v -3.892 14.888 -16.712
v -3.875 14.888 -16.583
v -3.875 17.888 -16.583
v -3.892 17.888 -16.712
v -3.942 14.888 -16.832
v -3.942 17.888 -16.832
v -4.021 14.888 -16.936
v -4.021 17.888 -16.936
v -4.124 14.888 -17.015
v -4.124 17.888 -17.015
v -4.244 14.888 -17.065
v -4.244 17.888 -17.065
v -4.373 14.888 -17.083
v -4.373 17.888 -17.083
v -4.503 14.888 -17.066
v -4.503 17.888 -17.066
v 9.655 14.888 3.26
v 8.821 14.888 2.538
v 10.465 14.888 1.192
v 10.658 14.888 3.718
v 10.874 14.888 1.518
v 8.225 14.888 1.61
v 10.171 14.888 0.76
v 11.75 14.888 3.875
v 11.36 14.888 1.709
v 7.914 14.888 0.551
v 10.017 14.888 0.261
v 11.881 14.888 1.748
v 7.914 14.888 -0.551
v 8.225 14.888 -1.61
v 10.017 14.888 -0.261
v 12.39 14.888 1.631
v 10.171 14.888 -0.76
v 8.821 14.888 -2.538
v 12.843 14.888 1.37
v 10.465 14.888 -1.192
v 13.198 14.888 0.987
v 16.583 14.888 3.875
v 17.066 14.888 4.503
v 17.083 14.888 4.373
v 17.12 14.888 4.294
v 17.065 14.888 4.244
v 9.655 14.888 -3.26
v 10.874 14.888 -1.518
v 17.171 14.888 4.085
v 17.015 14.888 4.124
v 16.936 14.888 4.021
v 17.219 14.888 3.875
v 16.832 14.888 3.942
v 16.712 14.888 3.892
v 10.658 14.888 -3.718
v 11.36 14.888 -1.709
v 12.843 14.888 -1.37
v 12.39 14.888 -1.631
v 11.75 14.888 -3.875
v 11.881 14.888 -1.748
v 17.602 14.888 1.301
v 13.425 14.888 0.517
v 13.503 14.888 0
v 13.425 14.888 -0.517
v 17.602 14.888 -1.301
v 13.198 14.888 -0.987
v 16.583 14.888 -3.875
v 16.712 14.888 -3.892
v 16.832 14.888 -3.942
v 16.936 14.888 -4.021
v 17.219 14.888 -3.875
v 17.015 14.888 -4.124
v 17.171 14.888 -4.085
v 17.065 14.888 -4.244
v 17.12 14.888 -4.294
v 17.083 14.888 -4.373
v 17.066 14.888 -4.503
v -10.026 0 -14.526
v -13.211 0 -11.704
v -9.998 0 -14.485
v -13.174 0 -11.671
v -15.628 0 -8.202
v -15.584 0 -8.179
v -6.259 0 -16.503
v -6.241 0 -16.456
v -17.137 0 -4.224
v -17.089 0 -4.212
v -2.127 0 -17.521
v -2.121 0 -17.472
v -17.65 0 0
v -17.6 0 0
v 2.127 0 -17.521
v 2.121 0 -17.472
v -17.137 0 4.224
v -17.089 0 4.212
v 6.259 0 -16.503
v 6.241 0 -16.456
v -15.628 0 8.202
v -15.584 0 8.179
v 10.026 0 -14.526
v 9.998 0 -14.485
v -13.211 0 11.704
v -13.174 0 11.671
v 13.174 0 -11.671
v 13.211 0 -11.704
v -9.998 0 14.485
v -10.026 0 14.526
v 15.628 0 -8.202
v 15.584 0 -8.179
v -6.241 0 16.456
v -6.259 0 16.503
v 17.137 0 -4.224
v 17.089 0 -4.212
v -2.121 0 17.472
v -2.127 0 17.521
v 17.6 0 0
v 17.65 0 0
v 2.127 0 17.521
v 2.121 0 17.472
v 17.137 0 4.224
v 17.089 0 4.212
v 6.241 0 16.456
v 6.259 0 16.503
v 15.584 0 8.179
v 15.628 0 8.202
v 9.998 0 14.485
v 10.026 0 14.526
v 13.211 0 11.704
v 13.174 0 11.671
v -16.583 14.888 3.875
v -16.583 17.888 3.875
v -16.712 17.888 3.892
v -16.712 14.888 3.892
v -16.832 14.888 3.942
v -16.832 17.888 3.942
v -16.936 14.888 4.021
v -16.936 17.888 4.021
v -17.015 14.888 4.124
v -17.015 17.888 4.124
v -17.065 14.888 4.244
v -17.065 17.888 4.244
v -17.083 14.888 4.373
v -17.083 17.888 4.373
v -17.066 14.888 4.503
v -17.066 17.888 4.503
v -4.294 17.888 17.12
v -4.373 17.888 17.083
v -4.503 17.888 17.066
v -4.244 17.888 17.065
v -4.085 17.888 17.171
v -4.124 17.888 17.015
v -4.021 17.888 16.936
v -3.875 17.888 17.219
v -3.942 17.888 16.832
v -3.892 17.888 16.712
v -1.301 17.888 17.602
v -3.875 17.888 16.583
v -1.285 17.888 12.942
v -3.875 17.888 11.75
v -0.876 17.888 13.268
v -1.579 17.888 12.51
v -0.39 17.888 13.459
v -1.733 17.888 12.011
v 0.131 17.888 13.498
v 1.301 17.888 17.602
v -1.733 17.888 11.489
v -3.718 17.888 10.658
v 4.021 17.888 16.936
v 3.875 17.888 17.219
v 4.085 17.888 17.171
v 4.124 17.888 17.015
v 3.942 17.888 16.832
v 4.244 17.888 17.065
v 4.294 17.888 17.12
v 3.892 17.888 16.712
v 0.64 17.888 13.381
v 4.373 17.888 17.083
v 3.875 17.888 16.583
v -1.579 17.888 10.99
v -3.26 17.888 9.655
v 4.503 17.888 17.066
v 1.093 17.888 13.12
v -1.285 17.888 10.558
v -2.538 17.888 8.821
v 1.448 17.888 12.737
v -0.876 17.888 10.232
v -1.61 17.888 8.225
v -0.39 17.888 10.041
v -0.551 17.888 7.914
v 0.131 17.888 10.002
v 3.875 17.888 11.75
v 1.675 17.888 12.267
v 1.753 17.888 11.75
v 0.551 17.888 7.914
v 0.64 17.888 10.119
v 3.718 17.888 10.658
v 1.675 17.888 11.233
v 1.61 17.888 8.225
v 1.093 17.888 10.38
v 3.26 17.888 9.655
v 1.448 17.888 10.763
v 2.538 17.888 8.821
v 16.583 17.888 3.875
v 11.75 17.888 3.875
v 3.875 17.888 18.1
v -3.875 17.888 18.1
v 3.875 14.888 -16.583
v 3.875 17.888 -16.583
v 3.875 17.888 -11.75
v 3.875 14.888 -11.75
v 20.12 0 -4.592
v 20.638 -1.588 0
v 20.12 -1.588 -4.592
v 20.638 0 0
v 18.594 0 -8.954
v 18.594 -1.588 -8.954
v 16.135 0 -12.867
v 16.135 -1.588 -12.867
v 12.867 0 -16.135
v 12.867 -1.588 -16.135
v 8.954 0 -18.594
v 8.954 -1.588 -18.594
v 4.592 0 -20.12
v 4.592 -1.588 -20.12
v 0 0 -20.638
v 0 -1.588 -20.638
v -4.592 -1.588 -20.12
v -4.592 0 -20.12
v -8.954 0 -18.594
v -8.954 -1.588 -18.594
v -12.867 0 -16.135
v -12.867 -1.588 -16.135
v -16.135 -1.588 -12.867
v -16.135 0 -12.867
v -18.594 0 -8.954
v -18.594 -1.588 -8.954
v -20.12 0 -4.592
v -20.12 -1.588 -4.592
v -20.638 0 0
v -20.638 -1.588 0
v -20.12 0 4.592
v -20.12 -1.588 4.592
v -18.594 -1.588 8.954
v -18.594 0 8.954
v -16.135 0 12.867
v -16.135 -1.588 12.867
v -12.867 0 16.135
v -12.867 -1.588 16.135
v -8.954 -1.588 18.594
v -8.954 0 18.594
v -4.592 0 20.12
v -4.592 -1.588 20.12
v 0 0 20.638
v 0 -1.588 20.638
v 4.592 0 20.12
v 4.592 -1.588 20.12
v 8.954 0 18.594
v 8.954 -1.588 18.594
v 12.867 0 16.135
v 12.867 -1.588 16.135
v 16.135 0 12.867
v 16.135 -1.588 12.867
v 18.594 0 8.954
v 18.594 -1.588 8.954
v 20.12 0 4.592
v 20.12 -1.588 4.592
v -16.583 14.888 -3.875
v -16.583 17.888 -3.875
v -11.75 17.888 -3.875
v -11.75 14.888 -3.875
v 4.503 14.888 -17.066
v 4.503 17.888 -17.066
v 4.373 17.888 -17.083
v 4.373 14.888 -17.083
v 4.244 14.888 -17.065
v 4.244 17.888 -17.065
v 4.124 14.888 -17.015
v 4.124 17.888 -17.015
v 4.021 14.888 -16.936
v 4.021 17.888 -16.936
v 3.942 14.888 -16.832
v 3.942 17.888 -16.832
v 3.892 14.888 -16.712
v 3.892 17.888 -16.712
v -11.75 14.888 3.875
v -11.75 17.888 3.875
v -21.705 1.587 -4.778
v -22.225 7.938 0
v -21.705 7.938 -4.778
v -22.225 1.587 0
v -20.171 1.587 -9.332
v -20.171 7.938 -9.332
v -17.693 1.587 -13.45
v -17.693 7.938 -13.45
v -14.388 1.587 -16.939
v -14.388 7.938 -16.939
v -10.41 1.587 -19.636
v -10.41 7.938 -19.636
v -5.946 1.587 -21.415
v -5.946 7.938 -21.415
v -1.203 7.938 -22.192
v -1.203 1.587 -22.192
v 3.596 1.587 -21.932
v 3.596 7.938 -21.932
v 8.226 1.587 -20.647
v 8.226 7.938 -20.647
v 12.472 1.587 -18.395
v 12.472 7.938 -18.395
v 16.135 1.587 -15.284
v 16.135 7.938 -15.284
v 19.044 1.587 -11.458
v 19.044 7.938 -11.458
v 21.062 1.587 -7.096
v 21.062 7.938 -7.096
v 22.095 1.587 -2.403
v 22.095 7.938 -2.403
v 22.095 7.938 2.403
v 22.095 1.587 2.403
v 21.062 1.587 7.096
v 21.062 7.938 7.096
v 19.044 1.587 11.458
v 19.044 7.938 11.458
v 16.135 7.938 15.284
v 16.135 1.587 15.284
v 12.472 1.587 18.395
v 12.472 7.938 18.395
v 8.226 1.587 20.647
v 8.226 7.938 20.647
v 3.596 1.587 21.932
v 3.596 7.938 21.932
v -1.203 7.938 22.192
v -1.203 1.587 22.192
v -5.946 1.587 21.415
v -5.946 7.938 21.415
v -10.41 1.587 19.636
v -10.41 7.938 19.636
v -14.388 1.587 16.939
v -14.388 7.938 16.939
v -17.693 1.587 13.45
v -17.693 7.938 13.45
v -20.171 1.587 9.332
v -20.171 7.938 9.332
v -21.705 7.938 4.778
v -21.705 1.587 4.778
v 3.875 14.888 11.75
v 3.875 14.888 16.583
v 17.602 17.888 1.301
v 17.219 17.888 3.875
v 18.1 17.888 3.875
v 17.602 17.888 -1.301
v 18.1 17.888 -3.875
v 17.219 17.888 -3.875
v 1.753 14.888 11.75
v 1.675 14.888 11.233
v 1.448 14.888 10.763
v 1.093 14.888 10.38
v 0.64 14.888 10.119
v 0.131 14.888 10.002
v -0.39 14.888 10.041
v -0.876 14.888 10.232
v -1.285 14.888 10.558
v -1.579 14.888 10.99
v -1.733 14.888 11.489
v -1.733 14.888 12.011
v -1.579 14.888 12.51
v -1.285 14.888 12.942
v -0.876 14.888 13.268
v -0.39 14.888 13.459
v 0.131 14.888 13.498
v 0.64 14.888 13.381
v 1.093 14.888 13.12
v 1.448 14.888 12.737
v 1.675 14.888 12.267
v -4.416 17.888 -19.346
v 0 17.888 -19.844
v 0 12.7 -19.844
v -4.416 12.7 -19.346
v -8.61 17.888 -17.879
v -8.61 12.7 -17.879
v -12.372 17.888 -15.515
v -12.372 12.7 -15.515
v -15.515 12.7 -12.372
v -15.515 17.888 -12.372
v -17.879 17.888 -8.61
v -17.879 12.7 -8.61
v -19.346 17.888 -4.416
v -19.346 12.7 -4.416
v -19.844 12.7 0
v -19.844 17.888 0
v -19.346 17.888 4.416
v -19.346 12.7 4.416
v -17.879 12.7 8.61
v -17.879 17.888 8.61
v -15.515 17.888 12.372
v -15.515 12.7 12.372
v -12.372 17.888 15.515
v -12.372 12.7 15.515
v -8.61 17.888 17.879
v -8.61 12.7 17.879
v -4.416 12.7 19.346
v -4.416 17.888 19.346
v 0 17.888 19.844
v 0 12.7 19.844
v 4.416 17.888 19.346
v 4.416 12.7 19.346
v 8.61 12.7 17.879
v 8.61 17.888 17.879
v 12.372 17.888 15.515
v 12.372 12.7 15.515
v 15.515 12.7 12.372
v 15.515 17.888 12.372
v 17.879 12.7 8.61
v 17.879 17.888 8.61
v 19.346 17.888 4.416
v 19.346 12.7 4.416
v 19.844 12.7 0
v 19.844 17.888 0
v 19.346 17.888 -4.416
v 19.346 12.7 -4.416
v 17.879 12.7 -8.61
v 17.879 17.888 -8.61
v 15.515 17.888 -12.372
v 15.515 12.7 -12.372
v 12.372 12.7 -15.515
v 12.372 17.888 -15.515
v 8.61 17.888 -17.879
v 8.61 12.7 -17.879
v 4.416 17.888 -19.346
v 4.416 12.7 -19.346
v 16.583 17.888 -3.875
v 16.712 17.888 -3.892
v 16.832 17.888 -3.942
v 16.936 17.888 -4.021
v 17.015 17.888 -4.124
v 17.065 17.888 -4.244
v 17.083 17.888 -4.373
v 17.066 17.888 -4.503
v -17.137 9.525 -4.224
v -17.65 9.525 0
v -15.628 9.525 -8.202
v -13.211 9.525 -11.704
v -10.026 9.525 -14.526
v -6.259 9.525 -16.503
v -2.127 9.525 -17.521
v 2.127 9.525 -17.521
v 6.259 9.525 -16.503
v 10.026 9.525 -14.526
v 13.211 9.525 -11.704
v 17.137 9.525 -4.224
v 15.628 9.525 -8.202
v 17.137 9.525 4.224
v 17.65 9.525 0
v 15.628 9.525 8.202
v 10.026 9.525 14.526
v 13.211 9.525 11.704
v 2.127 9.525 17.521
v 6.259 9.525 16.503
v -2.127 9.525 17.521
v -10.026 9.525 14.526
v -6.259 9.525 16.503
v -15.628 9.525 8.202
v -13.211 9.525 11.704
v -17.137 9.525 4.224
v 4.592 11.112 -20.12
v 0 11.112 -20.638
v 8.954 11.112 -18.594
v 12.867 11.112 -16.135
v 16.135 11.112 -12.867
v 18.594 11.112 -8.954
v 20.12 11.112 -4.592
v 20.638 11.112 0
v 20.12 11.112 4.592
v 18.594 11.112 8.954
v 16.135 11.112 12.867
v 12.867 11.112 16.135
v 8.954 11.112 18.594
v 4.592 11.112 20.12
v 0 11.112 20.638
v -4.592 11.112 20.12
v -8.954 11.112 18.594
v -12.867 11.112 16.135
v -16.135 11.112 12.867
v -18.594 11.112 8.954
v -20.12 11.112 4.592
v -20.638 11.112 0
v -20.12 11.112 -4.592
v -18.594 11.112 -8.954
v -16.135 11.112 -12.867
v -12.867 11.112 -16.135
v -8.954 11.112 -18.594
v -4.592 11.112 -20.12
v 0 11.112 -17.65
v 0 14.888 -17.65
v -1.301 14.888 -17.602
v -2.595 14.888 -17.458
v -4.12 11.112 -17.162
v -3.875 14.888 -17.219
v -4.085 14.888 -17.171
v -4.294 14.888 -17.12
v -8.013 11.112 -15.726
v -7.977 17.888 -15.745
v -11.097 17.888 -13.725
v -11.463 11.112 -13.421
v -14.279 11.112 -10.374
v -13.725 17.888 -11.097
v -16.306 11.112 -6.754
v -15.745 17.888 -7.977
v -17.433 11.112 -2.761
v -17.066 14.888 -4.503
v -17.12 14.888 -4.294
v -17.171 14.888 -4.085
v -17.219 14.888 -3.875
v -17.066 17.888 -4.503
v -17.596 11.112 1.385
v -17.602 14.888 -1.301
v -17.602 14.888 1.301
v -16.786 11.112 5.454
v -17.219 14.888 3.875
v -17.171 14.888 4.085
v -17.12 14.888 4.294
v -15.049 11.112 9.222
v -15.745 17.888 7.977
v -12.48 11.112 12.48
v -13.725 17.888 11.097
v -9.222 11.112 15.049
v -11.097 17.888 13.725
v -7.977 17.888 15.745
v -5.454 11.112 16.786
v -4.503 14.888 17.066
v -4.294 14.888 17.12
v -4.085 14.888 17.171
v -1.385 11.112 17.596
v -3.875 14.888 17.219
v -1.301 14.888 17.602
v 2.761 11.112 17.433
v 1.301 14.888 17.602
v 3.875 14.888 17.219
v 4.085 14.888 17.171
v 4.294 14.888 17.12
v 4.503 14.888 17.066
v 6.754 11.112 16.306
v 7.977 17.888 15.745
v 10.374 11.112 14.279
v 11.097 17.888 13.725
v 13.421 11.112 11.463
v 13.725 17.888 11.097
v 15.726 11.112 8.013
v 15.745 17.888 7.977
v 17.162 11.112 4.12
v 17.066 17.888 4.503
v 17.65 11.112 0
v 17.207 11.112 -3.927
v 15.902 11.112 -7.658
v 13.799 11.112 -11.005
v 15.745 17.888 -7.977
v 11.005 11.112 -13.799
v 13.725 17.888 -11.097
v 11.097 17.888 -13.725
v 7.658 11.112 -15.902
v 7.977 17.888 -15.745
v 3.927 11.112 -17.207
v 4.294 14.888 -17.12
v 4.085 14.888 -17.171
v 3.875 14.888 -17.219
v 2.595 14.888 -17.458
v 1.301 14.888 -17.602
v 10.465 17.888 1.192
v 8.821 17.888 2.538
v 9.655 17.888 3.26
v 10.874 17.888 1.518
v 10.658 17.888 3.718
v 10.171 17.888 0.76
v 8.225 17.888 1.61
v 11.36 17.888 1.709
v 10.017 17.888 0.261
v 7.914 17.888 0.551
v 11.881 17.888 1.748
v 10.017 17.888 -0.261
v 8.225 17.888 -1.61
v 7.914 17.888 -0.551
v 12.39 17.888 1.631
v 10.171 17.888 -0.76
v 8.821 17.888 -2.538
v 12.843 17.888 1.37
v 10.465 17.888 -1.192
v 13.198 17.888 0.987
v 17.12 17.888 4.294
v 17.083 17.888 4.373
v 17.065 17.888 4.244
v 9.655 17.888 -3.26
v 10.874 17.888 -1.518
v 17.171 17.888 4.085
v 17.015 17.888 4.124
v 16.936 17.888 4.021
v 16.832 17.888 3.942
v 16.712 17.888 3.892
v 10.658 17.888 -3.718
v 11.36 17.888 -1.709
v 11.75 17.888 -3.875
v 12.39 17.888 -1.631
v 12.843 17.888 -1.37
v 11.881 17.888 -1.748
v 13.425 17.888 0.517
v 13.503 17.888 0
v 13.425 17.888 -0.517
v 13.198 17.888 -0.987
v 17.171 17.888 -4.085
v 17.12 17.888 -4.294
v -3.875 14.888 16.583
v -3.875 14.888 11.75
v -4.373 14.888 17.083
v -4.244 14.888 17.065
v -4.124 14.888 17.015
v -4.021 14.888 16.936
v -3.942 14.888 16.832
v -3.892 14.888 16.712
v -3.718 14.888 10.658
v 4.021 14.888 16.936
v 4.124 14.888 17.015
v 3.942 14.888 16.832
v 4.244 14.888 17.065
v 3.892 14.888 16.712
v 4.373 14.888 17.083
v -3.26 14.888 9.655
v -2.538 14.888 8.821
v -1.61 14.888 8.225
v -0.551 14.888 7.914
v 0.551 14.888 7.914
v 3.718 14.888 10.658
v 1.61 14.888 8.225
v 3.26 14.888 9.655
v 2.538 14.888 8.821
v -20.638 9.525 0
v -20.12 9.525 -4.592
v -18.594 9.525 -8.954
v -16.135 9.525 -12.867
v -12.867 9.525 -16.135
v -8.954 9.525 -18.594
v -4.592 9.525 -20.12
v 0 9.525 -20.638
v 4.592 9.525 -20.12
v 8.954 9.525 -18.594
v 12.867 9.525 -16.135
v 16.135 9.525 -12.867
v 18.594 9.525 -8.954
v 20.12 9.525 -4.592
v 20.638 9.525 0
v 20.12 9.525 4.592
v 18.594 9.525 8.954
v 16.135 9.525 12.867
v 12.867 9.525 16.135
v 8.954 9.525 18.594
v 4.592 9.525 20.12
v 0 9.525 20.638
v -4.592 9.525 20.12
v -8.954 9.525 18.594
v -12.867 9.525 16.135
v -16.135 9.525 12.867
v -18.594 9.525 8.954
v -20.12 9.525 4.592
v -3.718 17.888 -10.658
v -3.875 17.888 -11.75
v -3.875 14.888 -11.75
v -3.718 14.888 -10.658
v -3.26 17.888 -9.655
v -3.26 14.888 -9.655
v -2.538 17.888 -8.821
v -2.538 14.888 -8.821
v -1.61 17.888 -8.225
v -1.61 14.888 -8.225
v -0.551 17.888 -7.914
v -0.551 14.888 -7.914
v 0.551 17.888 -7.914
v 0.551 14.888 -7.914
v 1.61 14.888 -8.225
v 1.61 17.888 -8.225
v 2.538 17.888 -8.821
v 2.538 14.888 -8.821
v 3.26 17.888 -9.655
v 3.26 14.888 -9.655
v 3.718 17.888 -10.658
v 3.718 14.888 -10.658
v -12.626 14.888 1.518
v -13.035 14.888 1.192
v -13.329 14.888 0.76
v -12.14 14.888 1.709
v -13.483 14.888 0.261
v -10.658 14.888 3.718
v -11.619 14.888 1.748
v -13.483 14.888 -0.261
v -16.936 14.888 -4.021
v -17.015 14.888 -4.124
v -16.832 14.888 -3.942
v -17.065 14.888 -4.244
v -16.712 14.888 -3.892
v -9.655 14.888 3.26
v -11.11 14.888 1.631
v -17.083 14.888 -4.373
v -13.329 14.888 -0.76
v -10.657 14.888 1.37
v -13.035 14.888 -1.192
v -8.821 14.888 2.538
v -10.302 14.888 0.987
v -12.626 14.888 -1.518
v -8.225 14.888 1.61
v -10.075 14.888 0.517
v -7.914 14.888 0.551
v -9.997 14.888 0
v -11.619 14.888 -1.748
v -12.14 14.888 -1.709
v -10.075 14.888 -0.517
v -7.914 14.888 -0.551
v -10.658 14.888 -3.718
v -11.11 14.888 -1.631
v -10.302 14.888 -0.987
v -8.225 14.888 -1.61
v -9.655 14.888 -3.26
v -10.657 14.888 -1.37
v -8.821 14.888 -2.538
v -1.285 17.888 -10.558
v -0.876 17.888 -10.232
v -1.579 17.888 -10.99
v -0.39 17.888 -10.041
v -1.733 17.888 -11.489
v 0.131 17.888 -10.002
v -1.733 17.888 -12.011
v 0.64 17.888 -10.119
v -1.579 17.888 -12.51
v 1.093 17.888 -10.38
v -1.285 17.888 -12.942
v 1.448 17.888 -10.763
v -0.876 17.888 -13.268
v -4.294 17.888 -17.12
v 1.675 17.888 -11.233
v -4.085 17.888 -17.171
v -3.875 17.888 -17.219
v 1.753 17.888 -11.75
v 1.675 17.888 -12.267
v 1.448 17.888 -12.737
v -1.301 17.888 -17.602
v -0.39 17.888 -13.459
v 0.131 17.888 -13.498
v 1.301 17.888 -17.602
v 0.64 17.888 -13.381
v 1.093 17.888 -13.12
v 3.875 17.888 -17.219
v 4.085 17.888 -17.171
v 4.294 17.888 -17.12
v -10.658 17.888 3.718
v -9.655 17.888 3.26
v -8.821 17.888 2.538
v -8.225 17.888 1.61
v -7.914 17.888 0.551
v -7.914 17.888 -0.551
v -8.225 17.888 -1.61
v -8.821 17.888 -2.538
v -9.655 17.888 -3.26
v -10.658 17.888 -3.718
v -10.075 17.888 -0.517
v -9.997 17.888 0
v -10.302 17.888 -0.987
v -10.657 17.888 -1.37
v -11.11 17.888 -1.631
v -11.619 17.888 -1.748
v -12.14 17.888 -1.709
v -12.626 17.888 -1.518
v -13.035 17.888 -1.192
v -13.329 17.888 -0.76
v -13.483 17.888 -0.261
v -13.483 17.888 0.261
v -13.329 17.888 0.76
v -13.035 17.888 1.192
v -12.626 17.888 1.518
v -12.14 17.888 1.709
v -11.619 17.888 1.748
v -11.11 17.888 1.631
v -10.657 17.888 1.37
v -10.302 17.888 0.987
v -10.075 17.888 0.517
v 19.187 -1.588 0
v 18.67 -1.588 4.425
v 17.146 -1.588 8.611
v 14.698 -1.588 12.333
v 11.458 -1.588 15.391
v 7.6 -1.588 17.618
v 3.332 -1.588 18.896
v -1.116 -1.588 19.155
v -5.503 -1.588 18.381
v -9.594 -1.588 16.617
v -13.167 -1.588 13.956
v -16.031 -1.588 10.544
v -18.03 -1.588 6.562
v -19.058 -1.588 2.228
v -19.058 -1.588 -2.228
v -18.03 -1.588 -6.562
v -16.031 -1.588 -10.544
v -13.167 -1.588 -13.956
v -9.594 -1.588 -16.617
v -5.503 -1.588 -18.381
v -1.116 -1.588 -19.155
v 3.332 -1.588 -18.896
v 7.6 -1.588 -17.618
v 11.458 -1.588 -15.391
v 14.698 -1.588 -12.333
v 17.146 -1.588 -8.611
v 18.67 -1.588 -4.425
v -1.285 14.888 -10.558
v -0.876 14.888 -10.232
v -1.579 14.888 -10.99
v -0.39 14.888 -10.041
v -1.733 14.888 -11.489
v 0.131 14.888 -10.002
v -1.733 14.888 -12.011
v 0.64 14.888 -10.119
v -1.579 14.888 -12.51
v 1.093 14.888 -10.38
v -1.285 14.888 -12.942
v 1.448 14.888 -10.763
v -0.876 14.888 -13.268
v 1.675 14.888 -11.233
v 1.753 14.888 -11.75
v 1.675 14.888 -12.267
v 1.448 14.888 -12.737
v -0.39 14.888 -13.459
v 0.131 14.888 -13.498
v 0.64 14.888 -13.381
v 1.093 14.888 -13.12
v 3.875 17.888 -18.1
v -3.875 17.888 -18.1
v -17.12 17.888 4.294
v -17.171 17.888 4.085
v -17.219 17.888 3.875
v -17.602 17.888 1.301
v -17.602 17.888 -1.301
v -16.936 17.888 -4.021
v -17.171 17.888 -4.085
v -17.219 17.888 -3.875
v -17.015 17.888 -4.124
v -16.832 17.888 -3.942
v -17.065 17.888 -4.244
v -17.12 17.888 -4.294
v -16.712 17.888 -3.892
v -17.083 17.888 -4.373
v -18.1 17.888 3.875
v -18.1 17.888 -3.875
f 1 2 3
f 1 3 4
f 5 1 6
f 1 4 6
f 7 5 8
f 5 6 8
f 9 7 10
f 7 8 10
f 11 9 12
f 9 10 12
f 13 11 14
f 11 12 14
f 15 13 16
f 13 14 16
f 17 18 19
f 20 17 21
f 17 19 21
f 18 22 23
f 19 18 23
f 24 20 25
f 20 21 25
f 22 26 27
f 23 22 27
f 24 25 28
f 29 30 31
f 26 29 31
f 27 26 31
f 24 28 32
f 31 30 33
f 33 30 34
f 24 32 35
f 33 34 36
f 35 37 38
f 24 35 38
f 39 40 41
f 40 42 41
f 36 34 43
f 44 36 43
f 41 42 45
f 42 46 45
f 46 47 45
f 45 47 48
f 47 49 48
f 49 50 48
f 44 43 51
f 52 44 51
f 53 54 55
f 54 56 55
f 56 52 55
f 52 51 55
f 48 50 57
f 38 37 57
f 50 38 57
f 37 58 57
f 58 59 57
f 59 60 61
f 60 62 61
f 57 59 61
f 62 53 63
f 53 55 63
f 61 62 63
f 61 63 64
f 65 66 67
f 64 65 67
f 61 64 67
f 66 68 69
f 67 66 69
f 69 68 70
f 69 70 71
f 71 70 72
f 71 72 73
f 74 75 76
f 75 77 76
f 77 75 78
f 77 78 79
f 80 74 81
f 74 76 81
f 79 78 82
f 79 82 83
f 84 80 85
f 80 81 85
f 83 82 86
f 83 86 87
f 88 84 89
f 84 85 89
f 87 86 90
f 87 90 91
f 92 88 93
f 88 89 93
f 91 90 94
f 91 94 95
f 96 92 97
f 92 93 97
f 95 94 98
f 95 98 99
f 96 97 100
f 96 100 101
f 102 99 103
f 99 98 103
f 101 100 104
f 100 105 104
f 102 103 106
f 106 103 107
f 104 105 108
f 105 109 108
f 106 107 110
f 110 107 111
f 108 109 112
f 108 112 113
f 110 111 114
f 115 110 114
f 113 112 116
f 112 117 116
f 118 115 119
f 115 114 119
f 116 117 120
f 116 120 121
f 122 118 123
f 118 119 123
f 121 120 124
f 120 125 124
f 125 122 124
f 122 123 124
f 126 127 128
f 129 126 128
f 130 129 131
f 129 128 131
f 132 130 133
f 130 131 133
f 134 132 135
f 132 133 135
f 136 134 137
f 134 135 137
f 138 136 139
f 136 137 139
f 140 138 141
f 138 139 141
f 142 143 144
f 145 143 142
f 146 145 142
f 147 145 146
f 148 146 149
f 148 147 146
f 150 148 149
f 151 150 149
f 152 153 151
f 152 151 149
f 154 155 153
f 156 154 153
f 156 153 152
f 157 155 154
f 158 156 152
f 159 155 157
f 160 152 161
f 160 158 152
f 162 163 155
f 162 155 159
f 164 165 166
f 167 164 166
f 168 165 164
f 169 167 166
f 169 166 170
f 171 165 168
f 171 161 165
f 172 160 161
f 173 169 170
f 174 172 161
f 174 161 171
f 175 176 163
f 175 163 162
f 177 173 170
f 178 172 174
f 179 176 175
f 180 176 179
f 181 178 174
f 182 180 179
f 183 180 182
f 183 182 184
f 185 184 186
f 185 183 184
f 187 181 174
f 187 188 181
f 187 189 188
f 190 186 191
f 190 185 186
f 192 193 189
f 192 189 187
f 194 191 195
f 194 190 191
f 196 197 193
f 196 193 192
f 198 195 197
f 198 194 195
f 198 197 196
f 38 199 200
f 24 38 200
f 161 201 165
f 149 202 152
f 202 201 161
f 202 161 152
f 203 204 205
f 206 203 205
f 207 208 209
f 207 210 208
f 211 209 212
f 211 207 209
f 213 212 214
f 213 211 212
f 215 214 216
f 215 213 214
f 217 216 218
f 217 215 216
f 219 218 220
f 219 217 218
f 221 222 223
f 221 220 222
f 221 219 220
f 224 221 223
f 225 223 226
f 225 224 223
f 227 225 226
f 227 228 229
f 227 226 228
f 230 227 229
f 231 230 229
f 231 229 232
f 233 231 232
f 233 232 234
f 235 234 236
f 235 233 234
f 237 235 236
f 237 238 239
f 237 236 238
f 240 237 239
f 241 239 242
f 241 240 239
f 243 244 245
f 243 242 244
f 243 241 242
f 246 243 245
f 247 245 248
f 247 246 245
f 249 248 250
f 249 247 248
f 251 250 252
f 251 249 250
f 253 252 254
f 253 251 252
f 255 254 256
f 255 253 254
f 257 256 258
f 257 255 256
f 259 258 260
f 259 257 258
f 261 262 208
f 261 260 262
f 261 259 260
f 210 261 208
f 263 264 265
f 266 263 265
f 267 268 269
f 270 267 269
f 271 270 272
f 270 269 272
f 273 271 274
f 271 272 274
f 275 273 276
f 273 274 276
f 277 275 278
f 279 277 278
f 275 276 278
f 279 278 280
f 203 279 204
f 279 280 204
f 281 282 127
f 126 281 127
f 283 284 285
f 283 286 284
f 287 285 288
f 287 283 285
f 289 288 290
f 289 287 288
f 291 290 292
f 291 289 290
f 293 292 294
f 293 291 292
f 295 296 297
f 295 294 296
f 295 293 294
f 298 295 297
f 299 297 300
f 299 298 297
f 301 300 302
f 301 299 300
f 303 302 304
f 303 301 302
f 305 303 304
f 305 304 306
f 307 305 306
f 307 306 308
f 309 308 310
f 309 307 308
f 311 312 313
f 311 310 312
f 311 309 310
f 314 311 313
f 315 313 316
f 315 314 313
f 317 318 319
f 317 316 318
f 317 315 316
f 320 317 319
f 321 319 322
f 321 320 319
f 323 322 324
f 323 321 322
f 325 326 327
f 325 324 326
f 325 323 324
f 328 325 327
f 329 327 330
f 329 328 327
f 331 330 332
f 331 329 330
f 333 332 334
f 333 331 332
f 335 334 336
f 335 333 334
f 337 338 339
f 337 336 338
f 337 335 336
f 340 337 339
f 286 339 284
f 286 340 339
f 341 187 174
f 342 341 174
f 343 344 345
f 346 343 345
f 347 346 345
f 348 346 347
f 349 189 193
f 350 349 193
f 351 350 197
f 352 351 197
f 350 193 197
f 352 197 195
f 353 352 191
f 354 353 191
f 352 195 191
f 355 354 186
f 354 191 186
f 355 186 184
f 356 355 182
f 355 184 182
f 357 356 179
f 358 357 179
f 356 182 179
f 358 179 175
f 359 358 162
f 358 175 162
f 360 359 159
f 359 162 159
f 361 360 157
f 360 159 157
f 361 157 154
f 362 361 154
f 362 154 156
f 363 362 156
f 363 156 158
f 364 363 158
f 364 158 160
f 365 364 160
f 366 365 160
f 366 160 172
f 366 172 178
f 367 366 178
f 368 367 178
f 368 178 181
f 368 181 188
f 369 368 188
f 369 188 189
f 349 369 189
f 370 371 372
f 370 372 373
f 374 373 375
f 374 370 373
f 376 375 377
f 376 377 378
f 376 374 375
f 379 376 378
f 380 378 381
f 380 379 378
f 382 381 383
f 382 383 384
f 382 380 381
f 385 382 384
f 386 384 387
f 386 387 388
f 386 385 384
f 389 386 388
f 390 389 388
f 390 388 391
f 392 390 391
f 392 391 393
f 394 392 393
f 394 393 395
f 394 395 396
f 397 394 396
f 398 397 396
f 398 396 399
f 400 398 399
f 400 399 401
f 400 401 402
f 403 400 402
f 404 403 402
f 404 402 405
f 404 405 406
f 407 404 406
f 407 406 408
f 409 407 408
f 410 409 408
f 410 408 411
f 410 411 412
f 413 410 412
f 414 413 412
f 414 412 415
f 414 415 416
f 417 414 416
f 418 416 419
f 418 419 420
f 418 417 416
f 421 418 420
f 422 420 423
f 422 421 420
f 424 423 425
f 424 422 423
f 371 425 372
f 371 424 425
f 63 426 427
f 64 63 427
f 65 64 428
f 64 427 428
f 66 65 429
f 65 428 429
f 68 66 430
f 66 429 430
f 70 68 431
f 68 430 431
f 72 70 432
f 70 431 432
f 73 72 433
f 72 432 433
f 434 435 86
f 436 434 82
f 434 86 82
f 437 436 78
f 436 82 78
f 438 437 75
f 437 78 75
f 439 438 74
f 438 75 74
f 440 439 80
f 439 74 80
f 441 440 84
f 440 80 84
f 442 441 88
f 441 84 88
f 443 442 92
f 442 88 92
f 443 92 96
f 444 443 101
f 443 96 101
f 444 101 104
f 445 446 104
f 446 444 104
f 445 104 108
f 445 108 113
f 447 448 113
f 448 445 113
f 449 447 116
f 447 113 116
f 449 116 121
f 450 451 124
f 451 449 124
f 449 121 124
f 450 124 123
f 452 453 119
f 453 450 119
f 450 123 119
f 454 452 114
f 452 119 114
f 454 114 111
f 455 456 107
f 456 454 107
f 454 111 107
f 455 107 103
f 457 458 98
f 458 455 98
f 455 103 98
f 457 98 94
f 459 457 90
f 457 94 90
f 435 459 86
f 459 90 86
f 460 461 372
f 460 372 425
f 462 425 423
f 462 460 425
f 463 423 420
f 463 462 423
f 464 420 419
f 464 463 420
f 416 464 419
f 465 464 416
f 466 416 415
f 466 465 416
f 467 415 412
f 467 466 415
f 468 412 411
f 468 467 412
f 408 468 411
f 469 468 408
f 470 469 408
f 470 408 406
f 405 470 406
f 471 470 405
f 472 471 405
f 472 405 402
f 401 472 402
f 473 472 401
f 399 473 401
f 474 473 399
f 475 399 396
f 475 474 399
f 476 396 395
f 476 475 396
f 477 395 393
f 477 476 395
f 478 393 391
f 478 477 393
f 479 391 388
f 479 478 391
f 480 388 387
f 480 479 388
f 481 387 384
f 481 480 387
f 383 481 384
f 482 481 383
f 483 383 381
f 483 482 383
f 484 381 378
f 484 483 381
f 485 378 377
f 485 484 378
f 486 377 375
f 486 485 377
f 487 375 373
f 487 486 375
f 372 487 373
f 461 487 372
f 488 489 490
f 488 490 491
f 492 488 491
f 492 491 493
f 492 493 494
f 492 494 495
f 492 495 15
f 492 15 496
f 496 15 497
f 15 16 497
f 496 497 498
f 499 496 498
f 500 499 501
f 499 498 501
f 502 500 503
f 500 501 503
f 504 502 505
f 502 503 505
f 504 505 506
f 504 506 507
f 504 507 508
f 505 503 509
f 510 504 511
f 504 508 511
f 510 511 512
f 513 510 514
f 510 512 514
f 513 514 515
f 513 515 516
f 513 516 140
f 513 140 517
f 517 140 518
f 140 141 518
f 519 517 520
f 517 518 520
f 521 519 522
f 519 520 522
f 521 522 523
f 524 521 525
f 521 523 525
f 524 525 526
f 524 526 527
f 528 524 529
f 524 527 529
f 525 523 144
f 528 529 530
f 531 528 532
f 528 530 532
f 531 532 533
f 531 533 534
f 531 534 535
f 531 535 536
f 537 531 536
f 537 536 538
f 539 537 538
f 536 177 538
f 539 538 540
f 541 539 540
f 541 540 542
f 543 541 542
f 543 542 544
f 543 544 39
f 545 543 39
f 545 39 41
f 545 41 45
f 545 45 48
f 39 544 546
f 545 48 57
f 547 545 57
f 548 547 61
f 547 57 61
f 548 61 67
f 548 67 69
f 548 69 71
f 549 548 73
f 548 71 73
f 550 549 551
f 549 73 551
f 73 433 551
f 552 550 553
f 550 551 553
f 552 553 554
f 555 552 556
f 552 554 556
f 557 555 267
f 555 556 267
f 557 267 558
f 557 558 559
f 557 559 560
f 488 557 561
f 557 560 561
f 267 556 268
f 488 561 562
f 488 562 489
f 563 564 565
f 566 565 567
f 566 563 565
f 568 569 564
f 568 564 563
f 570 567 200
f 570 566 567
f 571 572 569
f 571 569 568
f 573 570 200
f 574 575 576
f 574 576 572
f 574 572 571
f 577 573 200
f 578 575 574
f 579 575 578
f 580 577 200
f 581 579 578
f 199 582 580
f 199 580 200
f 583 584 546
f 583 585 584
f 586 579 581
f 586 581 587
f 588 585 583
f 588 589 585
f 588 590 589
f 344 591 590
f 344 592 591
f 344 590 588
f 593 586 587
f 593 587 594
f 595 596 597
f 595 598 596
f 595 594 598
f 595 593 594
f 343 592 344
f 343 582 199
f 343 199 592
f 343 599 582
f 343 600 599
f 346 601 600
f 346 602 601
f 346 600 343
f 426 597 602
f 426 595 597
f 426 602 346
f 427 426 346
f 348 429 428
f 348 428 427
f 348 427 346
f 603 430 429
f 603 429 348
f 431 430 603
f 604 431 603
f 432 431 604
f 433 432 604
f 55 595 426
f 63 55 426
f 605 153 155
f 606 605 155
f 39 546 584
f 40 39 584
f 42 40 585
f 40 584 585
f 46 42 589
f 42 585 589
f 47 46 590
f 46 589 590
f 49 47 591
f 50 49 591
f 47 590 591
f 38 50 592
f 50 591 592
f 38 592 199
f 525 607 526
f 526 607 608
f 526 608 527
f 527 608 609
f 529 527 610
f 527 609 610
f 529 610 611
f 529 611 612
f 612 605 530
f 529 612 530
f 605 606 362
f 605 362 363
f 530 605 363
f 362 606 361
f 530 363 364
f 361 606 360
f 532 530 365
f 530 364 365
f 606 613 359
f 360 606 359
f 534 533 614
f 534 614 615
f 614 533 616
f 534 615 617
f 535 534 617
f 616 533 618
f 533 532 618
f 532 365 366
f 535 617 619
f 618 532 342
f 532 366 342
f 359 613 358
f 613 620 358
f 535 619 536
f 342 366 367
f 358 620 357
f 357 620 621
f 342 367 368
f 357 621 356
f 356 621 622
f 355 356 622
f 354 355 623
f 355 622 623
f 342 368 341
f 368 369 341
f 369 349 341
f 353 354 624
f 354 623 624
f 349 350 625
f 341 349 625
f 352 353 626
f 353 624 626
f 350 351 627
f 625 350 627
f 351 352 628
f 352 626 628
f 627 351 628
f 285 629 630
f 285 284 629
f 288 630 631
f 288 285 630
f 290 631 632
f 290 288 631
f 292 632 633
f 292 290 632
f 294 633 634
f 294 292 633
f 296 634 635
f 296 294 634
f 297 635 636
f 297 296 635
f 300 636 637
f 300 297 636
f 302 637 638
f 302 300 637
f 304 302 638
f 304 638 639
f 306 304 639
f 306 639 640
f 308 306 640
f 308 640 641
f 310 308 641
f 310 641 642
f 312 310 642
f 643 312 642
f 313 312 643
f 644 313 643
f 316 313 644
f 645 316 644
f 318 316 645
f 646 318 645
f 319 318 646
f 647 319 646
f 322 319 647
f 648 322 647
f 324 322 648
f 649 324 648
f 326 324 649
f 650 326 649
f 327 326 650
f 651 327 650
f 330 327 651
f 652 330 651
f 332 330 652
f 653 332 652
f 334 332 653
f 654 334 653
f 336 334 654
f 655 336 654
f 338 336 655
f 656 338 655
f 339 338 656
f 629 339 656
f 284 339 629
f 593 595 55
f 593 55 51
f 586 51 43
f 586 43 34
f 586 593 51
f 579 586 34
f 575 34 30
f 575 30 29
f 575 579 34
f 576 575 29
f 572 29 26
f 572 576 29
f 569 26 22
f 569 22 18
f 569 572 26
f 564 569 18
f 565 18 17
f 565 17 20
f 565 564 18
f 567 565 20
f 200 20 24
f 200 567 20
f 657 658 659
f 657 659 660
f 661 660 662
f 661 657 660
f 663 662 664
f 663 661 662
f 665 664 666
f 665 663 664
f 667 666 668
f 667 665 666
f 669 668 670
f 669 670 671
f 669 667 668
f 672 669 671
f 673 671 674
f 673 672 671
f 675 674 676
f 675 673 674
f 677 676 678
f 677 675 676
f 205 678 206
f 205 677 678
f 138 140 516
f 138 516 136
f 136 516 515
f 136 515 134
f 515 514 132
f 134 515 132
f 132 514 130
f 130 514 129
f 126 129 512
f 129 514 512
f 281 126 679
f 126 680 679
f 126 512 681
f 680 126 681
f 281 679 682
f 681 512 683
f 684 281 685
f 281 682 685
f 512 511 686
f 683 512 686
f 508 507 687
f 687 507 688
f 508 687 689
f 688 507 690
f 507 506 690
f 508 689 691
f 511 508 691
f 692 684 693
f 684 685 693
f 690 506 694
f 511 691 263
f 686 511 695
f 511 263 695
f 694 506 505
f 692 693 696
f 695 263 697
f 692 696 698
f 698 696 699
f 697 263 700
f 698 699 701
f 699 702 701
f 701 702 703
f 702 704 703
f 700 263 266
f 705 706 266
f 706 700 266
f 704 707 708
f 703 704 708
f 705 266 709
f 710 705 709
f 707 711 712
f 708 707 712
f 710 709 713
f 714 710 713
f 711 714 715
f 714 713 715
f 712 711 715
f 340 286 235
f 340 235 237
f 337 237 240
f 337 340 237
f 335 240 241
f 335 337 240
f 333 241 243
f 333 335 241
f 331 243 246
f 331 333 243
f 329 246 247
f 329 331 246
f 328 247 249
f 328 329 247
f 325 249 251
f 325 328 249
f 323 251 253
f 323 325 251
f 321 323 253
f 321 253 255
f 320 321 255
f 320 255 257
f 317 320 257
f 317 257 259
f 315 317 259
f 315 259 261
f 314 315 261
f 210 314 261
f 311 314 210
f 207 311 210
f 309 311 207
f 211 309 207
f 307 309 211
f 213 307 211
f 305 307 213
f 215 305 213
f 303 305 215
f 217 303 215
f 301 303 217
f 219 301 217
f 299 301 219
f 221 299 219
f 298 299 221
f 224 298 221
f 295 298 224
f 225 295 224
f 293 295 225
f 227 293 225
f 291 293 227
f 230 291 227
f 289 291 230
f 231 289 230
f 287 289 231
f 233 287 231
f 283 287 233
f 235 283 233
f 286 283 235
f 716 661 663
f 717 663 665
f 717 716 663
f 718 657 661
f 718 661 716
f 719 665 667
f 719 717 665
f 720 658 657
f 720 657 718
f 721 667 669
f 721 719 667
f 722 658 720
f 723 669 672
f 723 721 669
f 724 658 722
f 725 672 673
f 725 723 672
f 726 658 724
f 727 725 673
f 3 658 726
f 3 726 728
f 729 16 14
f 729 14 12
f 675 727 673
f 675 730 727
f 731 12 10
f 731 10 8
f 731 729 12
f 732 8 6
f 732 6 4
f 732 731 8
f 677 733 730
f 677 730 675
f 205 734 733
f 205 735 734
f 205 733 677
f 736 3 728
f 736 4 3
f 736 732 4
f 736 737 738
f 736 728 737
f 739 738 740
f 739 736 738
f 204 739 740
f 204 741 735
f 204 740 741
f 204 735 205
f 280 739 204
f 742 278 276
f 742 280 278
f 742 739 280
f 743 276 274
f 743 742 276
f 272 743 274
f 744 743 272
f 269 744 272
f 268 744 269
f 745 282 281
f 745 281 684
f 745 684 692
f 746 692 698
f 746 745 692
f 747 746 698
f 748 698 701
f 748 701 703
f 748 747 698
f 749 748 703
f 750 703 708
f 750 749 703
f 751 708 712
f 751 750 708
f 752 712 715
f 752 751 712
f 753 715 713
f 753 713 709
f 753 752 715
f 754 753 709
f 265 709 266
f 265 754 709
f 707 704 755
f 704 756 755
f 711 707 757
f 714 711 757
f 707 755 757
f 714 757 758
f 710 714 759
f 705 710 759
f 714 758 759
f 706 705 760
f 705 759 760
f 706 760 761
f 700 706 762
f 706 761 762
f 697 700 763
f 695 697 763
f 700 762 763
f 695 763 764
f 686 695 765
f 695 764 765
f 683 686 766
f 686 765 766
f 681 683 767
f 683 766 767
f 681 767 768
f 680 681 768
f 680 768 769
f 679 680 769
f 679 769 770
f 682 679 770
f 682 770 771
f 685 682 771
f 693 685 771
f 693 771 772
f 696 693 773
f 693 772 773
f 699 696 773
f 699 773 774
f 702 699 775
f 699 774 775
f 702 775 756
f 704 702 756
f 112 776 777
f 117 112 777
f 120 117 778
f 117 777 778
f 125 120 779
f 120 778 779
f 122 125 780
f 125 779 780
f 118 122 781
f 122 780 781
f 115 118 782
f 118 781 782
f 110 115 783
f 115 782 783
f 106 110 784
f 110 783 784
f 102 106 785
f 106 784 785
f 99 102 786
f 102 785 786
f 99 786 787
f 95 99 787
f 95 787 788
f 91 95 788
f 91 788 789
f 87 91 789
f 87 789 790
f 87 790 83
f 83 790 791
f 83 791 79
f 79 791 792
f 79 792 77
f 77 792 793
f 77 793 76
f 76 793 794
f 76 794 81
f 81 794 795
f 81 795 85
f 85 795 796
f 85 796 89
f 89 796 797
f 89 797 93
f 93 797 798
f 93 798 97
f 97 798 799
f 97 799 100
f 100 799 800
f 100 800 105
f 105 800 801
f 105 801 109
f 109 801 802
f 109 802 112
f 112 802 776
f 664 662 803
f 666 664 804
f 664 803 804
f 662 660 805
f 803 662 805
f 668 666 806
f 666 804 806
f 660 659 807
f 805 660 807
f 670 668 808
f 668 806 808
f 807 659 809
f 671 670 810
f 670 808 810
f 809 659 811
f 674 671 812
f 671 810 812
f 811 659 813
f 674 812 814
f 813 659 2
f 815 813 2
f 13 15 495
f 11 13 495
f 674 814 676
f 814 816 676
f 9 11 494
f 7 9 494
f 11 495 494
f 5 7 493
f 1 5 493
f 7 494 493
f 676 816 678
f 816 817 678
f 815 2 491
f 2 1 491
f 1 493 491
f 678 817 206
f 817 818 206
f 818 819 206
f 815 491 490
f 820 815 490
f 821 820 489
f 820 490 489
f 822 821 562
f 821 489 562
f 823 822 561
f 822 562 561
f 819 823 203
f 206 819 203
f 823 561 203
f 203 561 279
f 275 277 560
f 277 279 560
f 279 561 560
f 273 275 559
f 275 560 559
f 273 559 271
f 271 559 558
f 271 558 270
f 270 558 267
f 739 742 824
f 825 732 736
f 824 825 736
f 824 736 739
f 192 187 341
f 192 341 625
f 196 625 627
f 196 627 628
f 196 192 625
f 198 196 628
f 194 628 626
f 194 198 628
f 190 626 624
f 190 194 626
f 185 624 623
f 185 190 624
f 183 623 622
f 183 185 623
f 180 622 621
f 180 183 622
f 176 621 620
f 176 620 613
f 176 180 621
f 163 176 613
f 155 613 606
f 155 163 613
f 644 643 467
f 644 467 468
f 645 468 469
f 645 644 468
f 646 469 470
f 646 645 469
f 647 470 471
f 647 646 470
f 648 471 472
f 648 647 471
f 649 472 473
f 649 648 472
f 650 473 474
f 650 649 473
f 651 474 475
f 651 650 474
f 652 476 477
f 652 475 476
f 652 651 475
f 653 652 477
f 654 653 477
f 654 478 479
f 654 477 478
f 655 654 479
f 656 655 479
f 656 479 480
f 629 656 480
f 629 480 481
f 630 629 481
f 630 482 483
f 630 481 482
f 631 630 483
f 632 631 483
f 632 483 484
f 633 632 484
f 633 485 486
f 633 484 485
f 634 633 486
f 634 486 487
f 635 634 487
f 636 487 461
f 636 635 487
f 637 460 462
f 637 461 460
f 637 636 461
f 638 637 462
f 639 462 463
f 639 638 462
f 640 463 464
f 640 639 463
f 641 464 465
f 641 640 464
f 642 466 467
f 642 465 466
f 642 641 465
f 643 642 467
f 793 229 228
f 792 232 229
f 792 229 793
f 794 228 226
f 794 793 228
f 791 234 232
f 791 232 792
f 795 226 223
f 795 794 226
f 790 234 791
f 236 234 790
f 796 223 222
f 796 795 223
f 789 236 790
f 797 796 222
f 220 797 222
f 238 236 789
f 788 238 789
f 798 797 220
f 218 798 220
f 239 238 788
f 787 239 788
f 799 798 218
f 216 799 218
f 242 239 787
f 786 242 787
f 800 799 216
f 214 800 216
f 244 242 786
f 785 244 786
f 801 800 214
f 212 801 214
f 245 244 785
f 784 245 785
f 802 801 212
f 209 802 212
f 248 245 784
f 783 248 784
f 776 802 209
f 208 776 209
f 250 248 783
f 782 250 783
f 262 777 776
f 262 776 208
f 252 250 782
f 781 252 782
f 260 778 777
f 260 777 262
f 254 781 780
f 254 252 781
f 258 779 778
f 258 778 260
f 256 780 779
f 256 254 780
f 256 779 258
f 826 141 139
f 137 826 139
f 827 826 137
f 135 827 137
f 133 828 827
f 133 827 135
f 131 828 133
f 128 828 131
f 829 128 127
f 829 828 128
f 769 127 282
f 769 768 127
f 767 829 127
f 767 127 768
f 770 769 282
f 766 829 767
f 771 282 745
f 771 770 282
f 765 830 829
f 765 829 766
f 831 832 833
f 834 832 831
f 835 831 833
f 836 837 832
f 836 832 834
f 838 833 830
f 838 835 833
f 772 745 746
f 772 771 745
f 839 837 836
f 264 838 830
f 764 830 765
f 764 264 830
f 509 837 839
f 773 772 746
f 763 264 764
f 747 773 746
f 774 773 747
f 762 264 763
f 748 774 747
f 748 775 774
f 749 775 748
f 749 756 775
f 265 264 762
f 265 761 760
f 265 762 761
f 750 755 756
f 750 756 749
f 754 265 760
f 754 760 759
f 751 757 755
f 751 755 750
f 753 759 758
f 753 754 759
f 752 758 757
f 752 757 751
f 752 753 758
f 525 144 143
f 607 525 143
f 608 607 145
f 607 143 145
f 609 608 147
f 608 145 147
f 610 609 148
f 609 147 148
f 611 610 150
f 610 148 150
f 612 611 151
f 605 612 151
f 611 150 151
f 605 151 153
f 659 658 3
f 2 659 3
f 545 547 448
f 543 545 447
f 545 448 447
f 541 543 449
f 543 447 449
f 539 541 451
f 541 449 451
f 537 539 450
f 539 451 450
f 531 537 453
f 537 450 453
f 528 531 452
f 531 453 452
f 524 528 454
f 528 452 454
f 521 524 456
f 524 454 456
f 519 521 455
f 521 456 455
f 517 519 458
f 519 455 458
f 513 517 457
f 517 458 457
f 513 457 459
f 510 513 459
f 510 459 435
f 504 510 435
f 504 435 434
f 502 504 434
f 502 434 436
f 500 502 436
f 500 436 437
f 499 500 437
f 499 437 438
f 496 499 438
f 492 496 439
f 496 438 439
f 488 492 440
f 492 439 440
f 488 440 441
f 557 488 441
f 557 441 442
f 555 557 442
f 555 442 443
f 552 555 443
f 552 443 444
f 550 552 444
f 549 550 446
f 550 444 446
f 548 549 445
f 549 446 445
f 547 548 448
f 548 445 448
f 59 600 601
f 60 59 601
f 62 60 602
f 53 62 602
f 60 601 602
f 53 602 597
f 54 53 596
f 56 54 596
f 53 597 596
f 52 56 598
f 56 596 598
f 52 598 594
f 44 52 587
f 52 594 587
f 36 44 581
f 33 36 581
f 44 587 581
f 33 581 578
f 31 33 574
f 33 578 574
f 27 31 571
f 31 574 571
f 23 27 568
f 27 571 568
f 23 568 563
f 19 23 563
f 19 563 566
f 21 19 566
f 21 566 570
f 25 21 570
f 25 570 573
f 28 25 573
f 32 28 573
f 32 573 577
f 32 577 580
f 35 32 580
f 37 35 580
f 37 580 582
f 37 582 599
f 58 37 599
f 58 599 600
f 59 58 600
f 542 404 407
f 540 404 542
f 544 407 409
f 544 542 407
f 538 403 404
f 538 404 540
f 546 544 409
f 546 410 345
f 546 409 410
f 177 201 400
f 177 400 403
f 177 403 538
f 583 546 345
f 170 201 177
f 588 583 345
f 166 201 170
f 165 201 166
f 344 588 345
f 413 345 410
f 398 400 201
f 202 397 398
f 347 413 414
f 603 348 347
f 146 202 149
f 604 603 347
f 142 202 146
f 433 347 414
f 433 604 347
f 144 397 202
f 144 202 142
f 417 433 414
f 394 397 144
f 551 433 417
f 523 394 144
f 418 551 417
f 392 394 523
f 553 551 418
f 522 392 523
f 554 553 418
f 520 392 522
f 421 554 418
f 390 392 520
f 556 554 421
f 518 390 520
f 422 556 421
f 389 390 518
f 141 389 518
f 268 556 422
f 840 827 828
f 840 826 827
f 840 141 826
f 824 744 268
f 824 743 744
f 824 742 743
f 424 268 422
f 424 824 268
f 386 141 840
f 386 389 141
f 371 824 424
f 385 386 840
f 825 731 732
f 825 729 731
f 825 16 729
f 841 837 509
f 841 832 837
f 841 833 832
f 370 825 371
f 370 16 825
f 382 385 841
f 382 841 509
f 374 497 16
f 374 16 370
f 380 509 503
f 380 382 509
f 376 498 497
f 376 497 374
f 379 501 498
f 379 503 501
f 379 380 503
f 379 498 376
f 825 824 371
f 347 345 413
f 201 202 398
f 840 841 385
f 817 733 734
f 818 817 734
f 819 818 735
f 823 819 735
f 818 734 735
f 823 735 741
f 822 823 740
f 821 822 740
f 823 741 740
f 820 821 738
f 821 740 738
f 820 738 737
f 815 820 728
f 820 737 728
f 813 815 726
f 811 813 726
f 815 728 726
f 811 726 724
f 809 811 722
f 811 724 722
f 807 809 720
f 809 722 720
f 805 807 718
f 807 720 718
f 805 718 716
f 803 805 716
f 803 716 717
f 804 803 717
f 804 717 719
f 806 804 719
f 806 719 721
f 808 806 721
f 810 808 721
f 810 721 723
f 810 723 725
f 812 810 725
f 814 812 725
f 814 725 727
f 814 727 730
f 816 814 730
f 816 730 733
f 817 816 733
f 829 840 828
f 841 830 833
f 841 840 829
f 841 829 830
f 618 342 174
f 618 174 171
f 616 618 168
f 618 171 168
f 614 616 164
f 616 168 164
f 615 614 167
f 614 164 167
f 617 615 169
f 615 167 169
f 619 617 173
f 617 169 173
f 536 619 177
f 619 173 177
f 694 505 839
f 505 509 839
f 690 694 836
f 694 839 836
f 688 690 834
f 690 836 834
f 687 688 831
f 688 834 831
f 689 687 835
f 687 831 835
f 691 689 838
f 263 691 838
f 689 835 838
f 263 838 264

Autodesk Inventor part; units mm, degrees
ref_plane "YZ Plane" through (0, 0, 0) normal (1, 0, 0) x (0, 1, 0)
ref_plane "XZ Plane" through (0, 0, 0) normal (0, 1, 0) x (-1, 0, 0)
sketch "Sketch1" plane through (0, 0, 0) normal (0, 1, 0) x (-1, 0, 0)
  circle A0 centre (0, 0) radius 22.225 construction
  circle A1 centre (0, 0) radius 17.65
  circle A2 centre (0, 0) radius 22.225
  dimension "d0" = 44.45
  dimension "d1" = 35.3
  dimension "d2" = 44.45
extrude "Extrusion1" add sketch "Sketch1" along normal blind 9.525
sketch "Sketch2" plane through (0, 0, 0) normal (0, -1, 0) x (1, 0, 0)
  circle A0 centre (0, 0) radius 17.6
  circle A1 centre (0, 0) radius 20.6375
  dimension "d5" = 41.275
  dimension "d6" = 35.2
extrude "Extrusion2" add sketch "Sketch2" along normal blind 1.5875
sketch "Sketch3" plane through (0, 9.525, 0) normal (0, 1, 0) x (1, 0, 0)
  circle A0 centre (0, 0) radius 17.65
  circle A1 centre (0, 0) radius 20.6375
  dimension "d9" = 35.3
  dimension "d10" = 41.275
extrude "Extrusion3" add sketch "Sketch3" along normal blind 1.5875
sketch "Sketch4" plane through (0, 0, 0) normal (1, 0, 0) x (0, 1, 0)
  line L0 (11.1125, -17.65) -> (17.8875, -17.65)
  line L1 (17.8875, -17.65) -> (17.8875, -20.6375)
  line L2 (17.8875, -20.6375) -> (11.1125, -20.6375) construction
  line L3 (11.1125, -20.6375) -> (11.1125, -17.65)
  line L4 (11.1125, -20.6375) -> (11.1125, 20.6375) projected
  line L5 (12.7, -17.65) -> (12.7, -20.6375) construction
  line L6 (11.1125, -20.6375) -> (12.7, -19.8438)
  line L7 (12.7, -19.8438) -> (17.8875, -19.8438)
  line L8 (0, 0) -> (25.7056, 0) construction
  line L9 (-11.1125, 0) -> (-11.1125, -19.8438) construction
  line L10 (0, 20.6375) -> (0, -20.6375) projected
  dimension "d13" = 17.65
  dimension "d14" = 20.6375
  dimension "d16" = 1.5875
  dimension "d18" = 19.8438
  dimension "d84" = 11.1125
  dimension "d85" = 29
revolve "Revolution1" add sketch "Sketch4" angle 360 about axis through (0, 0, 0) along (0, 1, 0)
ref_plane "Work Plane1" through (0, 4.7625, 0) normal (0, 1, 0) x (1, 0, 0)
sketch "Sketch11" plane through (0, 17.8875, 0) normal (0, 1, 0) x (1, 0, 0)
  circle A0 centre (0, 0) radius 11.75 construction
  line L0 (0, 0) -> (-11.75, 0) construction
  circle A1 centre (-11.75, 0) radius 3.875
  line L1 (-11.75, -3.875) -> (-18.1, -3.875)
  line L2 (-18.1, -3.875) -> (-18.1, 3.875)
  line L3 (-18.1, 3.875) -> (-11.75, 3.875)
  line L4 (-11.75, 3.875) -> (-11.75, -3.875) construction
  circle A2 centre (0, -11.75) radius 3.875
  line L5 (3.875, -11.75) -> (3.875, -18.1)
  line L6 (3.875, -18.1) -> (-3.875, -18.1)
  line L7 (-3.875, -18.1) -> (-3.875, -11.75)
  line L8 (-3.875, -11.75) -> (3.875, -11.75) construction
  circle A3 centre (11.75, 0) radius 3.875
  line L9 (11.75, 3.875) -> (18.1, 3.875)
  line L10 (18.1, 3.875) -> (18.1, -3.875)
  line L11 (18.1, -3.875) -> (11.75, -3.875)
  line L12 (11.75, -3.875) -> (11.75, 3.875) construction
  circle A4 centre (0, 11.75) radius 3.875
  line L13 (-3.875, 11.75) -> (-3.875, 18.1)
  line L14 (-3.875, 18.1) -> (3.875, 18.1)
  line L15 (3.875, 18.1) -> (3.875, 11.75)
  line L16 (3.875, 11.75) -> (-3.875, 11.75) construction
  circle A5 centre (0, -11.75) radius 1.7526
  circle A6 centre (11.75, 0) radius 1.7526
  circle A7 centre (0, 11.75) radius 1.7526
  circle A8 centre (-11.75, 0) radius 1.7526
  point P0 (3.875, 11.75)
  point P1 (11.75, -3.875)
  point P2 (-3.875, -11.75)
  point P3 (-11.75, 3.875)
  dimension "d121" = 23.5
  dimension "d122" = 7.75
  dimension "d123" = 6.35
  dimension "d126" = 360
  dimension "d134" = 3.5052
  dimension "d137" = 360
extrude "Extrusion10" add sketch "Sketch11" against normal blind 3
fillet "Fillet5" radius 0.5 8 edges at (-17.2194, 16.3875, -3.875) (-17.2194, 16.3875, 3.875) (-3.875, 16.3875, 17.2194) (3.875, 16.3875, 17.2194) (17.2194, 16.3875, -3.875) (17.2194, 16.3875, 3.875) (-3.875, 16.3875, -17.2194) (3.875, 16.3875, -17.2194)
chamfer "Chamfer5" distance 1.5875 angle 45 1 edges at (-17.6, -1.5875, 0)
chamfer "Chamfer6" distance 1.5875 angle 45 2 edges at (22.225, 9.525, 0) (22.225, 0, 0)
properties part number "Motor Hub" material "Nylon 6/6"
